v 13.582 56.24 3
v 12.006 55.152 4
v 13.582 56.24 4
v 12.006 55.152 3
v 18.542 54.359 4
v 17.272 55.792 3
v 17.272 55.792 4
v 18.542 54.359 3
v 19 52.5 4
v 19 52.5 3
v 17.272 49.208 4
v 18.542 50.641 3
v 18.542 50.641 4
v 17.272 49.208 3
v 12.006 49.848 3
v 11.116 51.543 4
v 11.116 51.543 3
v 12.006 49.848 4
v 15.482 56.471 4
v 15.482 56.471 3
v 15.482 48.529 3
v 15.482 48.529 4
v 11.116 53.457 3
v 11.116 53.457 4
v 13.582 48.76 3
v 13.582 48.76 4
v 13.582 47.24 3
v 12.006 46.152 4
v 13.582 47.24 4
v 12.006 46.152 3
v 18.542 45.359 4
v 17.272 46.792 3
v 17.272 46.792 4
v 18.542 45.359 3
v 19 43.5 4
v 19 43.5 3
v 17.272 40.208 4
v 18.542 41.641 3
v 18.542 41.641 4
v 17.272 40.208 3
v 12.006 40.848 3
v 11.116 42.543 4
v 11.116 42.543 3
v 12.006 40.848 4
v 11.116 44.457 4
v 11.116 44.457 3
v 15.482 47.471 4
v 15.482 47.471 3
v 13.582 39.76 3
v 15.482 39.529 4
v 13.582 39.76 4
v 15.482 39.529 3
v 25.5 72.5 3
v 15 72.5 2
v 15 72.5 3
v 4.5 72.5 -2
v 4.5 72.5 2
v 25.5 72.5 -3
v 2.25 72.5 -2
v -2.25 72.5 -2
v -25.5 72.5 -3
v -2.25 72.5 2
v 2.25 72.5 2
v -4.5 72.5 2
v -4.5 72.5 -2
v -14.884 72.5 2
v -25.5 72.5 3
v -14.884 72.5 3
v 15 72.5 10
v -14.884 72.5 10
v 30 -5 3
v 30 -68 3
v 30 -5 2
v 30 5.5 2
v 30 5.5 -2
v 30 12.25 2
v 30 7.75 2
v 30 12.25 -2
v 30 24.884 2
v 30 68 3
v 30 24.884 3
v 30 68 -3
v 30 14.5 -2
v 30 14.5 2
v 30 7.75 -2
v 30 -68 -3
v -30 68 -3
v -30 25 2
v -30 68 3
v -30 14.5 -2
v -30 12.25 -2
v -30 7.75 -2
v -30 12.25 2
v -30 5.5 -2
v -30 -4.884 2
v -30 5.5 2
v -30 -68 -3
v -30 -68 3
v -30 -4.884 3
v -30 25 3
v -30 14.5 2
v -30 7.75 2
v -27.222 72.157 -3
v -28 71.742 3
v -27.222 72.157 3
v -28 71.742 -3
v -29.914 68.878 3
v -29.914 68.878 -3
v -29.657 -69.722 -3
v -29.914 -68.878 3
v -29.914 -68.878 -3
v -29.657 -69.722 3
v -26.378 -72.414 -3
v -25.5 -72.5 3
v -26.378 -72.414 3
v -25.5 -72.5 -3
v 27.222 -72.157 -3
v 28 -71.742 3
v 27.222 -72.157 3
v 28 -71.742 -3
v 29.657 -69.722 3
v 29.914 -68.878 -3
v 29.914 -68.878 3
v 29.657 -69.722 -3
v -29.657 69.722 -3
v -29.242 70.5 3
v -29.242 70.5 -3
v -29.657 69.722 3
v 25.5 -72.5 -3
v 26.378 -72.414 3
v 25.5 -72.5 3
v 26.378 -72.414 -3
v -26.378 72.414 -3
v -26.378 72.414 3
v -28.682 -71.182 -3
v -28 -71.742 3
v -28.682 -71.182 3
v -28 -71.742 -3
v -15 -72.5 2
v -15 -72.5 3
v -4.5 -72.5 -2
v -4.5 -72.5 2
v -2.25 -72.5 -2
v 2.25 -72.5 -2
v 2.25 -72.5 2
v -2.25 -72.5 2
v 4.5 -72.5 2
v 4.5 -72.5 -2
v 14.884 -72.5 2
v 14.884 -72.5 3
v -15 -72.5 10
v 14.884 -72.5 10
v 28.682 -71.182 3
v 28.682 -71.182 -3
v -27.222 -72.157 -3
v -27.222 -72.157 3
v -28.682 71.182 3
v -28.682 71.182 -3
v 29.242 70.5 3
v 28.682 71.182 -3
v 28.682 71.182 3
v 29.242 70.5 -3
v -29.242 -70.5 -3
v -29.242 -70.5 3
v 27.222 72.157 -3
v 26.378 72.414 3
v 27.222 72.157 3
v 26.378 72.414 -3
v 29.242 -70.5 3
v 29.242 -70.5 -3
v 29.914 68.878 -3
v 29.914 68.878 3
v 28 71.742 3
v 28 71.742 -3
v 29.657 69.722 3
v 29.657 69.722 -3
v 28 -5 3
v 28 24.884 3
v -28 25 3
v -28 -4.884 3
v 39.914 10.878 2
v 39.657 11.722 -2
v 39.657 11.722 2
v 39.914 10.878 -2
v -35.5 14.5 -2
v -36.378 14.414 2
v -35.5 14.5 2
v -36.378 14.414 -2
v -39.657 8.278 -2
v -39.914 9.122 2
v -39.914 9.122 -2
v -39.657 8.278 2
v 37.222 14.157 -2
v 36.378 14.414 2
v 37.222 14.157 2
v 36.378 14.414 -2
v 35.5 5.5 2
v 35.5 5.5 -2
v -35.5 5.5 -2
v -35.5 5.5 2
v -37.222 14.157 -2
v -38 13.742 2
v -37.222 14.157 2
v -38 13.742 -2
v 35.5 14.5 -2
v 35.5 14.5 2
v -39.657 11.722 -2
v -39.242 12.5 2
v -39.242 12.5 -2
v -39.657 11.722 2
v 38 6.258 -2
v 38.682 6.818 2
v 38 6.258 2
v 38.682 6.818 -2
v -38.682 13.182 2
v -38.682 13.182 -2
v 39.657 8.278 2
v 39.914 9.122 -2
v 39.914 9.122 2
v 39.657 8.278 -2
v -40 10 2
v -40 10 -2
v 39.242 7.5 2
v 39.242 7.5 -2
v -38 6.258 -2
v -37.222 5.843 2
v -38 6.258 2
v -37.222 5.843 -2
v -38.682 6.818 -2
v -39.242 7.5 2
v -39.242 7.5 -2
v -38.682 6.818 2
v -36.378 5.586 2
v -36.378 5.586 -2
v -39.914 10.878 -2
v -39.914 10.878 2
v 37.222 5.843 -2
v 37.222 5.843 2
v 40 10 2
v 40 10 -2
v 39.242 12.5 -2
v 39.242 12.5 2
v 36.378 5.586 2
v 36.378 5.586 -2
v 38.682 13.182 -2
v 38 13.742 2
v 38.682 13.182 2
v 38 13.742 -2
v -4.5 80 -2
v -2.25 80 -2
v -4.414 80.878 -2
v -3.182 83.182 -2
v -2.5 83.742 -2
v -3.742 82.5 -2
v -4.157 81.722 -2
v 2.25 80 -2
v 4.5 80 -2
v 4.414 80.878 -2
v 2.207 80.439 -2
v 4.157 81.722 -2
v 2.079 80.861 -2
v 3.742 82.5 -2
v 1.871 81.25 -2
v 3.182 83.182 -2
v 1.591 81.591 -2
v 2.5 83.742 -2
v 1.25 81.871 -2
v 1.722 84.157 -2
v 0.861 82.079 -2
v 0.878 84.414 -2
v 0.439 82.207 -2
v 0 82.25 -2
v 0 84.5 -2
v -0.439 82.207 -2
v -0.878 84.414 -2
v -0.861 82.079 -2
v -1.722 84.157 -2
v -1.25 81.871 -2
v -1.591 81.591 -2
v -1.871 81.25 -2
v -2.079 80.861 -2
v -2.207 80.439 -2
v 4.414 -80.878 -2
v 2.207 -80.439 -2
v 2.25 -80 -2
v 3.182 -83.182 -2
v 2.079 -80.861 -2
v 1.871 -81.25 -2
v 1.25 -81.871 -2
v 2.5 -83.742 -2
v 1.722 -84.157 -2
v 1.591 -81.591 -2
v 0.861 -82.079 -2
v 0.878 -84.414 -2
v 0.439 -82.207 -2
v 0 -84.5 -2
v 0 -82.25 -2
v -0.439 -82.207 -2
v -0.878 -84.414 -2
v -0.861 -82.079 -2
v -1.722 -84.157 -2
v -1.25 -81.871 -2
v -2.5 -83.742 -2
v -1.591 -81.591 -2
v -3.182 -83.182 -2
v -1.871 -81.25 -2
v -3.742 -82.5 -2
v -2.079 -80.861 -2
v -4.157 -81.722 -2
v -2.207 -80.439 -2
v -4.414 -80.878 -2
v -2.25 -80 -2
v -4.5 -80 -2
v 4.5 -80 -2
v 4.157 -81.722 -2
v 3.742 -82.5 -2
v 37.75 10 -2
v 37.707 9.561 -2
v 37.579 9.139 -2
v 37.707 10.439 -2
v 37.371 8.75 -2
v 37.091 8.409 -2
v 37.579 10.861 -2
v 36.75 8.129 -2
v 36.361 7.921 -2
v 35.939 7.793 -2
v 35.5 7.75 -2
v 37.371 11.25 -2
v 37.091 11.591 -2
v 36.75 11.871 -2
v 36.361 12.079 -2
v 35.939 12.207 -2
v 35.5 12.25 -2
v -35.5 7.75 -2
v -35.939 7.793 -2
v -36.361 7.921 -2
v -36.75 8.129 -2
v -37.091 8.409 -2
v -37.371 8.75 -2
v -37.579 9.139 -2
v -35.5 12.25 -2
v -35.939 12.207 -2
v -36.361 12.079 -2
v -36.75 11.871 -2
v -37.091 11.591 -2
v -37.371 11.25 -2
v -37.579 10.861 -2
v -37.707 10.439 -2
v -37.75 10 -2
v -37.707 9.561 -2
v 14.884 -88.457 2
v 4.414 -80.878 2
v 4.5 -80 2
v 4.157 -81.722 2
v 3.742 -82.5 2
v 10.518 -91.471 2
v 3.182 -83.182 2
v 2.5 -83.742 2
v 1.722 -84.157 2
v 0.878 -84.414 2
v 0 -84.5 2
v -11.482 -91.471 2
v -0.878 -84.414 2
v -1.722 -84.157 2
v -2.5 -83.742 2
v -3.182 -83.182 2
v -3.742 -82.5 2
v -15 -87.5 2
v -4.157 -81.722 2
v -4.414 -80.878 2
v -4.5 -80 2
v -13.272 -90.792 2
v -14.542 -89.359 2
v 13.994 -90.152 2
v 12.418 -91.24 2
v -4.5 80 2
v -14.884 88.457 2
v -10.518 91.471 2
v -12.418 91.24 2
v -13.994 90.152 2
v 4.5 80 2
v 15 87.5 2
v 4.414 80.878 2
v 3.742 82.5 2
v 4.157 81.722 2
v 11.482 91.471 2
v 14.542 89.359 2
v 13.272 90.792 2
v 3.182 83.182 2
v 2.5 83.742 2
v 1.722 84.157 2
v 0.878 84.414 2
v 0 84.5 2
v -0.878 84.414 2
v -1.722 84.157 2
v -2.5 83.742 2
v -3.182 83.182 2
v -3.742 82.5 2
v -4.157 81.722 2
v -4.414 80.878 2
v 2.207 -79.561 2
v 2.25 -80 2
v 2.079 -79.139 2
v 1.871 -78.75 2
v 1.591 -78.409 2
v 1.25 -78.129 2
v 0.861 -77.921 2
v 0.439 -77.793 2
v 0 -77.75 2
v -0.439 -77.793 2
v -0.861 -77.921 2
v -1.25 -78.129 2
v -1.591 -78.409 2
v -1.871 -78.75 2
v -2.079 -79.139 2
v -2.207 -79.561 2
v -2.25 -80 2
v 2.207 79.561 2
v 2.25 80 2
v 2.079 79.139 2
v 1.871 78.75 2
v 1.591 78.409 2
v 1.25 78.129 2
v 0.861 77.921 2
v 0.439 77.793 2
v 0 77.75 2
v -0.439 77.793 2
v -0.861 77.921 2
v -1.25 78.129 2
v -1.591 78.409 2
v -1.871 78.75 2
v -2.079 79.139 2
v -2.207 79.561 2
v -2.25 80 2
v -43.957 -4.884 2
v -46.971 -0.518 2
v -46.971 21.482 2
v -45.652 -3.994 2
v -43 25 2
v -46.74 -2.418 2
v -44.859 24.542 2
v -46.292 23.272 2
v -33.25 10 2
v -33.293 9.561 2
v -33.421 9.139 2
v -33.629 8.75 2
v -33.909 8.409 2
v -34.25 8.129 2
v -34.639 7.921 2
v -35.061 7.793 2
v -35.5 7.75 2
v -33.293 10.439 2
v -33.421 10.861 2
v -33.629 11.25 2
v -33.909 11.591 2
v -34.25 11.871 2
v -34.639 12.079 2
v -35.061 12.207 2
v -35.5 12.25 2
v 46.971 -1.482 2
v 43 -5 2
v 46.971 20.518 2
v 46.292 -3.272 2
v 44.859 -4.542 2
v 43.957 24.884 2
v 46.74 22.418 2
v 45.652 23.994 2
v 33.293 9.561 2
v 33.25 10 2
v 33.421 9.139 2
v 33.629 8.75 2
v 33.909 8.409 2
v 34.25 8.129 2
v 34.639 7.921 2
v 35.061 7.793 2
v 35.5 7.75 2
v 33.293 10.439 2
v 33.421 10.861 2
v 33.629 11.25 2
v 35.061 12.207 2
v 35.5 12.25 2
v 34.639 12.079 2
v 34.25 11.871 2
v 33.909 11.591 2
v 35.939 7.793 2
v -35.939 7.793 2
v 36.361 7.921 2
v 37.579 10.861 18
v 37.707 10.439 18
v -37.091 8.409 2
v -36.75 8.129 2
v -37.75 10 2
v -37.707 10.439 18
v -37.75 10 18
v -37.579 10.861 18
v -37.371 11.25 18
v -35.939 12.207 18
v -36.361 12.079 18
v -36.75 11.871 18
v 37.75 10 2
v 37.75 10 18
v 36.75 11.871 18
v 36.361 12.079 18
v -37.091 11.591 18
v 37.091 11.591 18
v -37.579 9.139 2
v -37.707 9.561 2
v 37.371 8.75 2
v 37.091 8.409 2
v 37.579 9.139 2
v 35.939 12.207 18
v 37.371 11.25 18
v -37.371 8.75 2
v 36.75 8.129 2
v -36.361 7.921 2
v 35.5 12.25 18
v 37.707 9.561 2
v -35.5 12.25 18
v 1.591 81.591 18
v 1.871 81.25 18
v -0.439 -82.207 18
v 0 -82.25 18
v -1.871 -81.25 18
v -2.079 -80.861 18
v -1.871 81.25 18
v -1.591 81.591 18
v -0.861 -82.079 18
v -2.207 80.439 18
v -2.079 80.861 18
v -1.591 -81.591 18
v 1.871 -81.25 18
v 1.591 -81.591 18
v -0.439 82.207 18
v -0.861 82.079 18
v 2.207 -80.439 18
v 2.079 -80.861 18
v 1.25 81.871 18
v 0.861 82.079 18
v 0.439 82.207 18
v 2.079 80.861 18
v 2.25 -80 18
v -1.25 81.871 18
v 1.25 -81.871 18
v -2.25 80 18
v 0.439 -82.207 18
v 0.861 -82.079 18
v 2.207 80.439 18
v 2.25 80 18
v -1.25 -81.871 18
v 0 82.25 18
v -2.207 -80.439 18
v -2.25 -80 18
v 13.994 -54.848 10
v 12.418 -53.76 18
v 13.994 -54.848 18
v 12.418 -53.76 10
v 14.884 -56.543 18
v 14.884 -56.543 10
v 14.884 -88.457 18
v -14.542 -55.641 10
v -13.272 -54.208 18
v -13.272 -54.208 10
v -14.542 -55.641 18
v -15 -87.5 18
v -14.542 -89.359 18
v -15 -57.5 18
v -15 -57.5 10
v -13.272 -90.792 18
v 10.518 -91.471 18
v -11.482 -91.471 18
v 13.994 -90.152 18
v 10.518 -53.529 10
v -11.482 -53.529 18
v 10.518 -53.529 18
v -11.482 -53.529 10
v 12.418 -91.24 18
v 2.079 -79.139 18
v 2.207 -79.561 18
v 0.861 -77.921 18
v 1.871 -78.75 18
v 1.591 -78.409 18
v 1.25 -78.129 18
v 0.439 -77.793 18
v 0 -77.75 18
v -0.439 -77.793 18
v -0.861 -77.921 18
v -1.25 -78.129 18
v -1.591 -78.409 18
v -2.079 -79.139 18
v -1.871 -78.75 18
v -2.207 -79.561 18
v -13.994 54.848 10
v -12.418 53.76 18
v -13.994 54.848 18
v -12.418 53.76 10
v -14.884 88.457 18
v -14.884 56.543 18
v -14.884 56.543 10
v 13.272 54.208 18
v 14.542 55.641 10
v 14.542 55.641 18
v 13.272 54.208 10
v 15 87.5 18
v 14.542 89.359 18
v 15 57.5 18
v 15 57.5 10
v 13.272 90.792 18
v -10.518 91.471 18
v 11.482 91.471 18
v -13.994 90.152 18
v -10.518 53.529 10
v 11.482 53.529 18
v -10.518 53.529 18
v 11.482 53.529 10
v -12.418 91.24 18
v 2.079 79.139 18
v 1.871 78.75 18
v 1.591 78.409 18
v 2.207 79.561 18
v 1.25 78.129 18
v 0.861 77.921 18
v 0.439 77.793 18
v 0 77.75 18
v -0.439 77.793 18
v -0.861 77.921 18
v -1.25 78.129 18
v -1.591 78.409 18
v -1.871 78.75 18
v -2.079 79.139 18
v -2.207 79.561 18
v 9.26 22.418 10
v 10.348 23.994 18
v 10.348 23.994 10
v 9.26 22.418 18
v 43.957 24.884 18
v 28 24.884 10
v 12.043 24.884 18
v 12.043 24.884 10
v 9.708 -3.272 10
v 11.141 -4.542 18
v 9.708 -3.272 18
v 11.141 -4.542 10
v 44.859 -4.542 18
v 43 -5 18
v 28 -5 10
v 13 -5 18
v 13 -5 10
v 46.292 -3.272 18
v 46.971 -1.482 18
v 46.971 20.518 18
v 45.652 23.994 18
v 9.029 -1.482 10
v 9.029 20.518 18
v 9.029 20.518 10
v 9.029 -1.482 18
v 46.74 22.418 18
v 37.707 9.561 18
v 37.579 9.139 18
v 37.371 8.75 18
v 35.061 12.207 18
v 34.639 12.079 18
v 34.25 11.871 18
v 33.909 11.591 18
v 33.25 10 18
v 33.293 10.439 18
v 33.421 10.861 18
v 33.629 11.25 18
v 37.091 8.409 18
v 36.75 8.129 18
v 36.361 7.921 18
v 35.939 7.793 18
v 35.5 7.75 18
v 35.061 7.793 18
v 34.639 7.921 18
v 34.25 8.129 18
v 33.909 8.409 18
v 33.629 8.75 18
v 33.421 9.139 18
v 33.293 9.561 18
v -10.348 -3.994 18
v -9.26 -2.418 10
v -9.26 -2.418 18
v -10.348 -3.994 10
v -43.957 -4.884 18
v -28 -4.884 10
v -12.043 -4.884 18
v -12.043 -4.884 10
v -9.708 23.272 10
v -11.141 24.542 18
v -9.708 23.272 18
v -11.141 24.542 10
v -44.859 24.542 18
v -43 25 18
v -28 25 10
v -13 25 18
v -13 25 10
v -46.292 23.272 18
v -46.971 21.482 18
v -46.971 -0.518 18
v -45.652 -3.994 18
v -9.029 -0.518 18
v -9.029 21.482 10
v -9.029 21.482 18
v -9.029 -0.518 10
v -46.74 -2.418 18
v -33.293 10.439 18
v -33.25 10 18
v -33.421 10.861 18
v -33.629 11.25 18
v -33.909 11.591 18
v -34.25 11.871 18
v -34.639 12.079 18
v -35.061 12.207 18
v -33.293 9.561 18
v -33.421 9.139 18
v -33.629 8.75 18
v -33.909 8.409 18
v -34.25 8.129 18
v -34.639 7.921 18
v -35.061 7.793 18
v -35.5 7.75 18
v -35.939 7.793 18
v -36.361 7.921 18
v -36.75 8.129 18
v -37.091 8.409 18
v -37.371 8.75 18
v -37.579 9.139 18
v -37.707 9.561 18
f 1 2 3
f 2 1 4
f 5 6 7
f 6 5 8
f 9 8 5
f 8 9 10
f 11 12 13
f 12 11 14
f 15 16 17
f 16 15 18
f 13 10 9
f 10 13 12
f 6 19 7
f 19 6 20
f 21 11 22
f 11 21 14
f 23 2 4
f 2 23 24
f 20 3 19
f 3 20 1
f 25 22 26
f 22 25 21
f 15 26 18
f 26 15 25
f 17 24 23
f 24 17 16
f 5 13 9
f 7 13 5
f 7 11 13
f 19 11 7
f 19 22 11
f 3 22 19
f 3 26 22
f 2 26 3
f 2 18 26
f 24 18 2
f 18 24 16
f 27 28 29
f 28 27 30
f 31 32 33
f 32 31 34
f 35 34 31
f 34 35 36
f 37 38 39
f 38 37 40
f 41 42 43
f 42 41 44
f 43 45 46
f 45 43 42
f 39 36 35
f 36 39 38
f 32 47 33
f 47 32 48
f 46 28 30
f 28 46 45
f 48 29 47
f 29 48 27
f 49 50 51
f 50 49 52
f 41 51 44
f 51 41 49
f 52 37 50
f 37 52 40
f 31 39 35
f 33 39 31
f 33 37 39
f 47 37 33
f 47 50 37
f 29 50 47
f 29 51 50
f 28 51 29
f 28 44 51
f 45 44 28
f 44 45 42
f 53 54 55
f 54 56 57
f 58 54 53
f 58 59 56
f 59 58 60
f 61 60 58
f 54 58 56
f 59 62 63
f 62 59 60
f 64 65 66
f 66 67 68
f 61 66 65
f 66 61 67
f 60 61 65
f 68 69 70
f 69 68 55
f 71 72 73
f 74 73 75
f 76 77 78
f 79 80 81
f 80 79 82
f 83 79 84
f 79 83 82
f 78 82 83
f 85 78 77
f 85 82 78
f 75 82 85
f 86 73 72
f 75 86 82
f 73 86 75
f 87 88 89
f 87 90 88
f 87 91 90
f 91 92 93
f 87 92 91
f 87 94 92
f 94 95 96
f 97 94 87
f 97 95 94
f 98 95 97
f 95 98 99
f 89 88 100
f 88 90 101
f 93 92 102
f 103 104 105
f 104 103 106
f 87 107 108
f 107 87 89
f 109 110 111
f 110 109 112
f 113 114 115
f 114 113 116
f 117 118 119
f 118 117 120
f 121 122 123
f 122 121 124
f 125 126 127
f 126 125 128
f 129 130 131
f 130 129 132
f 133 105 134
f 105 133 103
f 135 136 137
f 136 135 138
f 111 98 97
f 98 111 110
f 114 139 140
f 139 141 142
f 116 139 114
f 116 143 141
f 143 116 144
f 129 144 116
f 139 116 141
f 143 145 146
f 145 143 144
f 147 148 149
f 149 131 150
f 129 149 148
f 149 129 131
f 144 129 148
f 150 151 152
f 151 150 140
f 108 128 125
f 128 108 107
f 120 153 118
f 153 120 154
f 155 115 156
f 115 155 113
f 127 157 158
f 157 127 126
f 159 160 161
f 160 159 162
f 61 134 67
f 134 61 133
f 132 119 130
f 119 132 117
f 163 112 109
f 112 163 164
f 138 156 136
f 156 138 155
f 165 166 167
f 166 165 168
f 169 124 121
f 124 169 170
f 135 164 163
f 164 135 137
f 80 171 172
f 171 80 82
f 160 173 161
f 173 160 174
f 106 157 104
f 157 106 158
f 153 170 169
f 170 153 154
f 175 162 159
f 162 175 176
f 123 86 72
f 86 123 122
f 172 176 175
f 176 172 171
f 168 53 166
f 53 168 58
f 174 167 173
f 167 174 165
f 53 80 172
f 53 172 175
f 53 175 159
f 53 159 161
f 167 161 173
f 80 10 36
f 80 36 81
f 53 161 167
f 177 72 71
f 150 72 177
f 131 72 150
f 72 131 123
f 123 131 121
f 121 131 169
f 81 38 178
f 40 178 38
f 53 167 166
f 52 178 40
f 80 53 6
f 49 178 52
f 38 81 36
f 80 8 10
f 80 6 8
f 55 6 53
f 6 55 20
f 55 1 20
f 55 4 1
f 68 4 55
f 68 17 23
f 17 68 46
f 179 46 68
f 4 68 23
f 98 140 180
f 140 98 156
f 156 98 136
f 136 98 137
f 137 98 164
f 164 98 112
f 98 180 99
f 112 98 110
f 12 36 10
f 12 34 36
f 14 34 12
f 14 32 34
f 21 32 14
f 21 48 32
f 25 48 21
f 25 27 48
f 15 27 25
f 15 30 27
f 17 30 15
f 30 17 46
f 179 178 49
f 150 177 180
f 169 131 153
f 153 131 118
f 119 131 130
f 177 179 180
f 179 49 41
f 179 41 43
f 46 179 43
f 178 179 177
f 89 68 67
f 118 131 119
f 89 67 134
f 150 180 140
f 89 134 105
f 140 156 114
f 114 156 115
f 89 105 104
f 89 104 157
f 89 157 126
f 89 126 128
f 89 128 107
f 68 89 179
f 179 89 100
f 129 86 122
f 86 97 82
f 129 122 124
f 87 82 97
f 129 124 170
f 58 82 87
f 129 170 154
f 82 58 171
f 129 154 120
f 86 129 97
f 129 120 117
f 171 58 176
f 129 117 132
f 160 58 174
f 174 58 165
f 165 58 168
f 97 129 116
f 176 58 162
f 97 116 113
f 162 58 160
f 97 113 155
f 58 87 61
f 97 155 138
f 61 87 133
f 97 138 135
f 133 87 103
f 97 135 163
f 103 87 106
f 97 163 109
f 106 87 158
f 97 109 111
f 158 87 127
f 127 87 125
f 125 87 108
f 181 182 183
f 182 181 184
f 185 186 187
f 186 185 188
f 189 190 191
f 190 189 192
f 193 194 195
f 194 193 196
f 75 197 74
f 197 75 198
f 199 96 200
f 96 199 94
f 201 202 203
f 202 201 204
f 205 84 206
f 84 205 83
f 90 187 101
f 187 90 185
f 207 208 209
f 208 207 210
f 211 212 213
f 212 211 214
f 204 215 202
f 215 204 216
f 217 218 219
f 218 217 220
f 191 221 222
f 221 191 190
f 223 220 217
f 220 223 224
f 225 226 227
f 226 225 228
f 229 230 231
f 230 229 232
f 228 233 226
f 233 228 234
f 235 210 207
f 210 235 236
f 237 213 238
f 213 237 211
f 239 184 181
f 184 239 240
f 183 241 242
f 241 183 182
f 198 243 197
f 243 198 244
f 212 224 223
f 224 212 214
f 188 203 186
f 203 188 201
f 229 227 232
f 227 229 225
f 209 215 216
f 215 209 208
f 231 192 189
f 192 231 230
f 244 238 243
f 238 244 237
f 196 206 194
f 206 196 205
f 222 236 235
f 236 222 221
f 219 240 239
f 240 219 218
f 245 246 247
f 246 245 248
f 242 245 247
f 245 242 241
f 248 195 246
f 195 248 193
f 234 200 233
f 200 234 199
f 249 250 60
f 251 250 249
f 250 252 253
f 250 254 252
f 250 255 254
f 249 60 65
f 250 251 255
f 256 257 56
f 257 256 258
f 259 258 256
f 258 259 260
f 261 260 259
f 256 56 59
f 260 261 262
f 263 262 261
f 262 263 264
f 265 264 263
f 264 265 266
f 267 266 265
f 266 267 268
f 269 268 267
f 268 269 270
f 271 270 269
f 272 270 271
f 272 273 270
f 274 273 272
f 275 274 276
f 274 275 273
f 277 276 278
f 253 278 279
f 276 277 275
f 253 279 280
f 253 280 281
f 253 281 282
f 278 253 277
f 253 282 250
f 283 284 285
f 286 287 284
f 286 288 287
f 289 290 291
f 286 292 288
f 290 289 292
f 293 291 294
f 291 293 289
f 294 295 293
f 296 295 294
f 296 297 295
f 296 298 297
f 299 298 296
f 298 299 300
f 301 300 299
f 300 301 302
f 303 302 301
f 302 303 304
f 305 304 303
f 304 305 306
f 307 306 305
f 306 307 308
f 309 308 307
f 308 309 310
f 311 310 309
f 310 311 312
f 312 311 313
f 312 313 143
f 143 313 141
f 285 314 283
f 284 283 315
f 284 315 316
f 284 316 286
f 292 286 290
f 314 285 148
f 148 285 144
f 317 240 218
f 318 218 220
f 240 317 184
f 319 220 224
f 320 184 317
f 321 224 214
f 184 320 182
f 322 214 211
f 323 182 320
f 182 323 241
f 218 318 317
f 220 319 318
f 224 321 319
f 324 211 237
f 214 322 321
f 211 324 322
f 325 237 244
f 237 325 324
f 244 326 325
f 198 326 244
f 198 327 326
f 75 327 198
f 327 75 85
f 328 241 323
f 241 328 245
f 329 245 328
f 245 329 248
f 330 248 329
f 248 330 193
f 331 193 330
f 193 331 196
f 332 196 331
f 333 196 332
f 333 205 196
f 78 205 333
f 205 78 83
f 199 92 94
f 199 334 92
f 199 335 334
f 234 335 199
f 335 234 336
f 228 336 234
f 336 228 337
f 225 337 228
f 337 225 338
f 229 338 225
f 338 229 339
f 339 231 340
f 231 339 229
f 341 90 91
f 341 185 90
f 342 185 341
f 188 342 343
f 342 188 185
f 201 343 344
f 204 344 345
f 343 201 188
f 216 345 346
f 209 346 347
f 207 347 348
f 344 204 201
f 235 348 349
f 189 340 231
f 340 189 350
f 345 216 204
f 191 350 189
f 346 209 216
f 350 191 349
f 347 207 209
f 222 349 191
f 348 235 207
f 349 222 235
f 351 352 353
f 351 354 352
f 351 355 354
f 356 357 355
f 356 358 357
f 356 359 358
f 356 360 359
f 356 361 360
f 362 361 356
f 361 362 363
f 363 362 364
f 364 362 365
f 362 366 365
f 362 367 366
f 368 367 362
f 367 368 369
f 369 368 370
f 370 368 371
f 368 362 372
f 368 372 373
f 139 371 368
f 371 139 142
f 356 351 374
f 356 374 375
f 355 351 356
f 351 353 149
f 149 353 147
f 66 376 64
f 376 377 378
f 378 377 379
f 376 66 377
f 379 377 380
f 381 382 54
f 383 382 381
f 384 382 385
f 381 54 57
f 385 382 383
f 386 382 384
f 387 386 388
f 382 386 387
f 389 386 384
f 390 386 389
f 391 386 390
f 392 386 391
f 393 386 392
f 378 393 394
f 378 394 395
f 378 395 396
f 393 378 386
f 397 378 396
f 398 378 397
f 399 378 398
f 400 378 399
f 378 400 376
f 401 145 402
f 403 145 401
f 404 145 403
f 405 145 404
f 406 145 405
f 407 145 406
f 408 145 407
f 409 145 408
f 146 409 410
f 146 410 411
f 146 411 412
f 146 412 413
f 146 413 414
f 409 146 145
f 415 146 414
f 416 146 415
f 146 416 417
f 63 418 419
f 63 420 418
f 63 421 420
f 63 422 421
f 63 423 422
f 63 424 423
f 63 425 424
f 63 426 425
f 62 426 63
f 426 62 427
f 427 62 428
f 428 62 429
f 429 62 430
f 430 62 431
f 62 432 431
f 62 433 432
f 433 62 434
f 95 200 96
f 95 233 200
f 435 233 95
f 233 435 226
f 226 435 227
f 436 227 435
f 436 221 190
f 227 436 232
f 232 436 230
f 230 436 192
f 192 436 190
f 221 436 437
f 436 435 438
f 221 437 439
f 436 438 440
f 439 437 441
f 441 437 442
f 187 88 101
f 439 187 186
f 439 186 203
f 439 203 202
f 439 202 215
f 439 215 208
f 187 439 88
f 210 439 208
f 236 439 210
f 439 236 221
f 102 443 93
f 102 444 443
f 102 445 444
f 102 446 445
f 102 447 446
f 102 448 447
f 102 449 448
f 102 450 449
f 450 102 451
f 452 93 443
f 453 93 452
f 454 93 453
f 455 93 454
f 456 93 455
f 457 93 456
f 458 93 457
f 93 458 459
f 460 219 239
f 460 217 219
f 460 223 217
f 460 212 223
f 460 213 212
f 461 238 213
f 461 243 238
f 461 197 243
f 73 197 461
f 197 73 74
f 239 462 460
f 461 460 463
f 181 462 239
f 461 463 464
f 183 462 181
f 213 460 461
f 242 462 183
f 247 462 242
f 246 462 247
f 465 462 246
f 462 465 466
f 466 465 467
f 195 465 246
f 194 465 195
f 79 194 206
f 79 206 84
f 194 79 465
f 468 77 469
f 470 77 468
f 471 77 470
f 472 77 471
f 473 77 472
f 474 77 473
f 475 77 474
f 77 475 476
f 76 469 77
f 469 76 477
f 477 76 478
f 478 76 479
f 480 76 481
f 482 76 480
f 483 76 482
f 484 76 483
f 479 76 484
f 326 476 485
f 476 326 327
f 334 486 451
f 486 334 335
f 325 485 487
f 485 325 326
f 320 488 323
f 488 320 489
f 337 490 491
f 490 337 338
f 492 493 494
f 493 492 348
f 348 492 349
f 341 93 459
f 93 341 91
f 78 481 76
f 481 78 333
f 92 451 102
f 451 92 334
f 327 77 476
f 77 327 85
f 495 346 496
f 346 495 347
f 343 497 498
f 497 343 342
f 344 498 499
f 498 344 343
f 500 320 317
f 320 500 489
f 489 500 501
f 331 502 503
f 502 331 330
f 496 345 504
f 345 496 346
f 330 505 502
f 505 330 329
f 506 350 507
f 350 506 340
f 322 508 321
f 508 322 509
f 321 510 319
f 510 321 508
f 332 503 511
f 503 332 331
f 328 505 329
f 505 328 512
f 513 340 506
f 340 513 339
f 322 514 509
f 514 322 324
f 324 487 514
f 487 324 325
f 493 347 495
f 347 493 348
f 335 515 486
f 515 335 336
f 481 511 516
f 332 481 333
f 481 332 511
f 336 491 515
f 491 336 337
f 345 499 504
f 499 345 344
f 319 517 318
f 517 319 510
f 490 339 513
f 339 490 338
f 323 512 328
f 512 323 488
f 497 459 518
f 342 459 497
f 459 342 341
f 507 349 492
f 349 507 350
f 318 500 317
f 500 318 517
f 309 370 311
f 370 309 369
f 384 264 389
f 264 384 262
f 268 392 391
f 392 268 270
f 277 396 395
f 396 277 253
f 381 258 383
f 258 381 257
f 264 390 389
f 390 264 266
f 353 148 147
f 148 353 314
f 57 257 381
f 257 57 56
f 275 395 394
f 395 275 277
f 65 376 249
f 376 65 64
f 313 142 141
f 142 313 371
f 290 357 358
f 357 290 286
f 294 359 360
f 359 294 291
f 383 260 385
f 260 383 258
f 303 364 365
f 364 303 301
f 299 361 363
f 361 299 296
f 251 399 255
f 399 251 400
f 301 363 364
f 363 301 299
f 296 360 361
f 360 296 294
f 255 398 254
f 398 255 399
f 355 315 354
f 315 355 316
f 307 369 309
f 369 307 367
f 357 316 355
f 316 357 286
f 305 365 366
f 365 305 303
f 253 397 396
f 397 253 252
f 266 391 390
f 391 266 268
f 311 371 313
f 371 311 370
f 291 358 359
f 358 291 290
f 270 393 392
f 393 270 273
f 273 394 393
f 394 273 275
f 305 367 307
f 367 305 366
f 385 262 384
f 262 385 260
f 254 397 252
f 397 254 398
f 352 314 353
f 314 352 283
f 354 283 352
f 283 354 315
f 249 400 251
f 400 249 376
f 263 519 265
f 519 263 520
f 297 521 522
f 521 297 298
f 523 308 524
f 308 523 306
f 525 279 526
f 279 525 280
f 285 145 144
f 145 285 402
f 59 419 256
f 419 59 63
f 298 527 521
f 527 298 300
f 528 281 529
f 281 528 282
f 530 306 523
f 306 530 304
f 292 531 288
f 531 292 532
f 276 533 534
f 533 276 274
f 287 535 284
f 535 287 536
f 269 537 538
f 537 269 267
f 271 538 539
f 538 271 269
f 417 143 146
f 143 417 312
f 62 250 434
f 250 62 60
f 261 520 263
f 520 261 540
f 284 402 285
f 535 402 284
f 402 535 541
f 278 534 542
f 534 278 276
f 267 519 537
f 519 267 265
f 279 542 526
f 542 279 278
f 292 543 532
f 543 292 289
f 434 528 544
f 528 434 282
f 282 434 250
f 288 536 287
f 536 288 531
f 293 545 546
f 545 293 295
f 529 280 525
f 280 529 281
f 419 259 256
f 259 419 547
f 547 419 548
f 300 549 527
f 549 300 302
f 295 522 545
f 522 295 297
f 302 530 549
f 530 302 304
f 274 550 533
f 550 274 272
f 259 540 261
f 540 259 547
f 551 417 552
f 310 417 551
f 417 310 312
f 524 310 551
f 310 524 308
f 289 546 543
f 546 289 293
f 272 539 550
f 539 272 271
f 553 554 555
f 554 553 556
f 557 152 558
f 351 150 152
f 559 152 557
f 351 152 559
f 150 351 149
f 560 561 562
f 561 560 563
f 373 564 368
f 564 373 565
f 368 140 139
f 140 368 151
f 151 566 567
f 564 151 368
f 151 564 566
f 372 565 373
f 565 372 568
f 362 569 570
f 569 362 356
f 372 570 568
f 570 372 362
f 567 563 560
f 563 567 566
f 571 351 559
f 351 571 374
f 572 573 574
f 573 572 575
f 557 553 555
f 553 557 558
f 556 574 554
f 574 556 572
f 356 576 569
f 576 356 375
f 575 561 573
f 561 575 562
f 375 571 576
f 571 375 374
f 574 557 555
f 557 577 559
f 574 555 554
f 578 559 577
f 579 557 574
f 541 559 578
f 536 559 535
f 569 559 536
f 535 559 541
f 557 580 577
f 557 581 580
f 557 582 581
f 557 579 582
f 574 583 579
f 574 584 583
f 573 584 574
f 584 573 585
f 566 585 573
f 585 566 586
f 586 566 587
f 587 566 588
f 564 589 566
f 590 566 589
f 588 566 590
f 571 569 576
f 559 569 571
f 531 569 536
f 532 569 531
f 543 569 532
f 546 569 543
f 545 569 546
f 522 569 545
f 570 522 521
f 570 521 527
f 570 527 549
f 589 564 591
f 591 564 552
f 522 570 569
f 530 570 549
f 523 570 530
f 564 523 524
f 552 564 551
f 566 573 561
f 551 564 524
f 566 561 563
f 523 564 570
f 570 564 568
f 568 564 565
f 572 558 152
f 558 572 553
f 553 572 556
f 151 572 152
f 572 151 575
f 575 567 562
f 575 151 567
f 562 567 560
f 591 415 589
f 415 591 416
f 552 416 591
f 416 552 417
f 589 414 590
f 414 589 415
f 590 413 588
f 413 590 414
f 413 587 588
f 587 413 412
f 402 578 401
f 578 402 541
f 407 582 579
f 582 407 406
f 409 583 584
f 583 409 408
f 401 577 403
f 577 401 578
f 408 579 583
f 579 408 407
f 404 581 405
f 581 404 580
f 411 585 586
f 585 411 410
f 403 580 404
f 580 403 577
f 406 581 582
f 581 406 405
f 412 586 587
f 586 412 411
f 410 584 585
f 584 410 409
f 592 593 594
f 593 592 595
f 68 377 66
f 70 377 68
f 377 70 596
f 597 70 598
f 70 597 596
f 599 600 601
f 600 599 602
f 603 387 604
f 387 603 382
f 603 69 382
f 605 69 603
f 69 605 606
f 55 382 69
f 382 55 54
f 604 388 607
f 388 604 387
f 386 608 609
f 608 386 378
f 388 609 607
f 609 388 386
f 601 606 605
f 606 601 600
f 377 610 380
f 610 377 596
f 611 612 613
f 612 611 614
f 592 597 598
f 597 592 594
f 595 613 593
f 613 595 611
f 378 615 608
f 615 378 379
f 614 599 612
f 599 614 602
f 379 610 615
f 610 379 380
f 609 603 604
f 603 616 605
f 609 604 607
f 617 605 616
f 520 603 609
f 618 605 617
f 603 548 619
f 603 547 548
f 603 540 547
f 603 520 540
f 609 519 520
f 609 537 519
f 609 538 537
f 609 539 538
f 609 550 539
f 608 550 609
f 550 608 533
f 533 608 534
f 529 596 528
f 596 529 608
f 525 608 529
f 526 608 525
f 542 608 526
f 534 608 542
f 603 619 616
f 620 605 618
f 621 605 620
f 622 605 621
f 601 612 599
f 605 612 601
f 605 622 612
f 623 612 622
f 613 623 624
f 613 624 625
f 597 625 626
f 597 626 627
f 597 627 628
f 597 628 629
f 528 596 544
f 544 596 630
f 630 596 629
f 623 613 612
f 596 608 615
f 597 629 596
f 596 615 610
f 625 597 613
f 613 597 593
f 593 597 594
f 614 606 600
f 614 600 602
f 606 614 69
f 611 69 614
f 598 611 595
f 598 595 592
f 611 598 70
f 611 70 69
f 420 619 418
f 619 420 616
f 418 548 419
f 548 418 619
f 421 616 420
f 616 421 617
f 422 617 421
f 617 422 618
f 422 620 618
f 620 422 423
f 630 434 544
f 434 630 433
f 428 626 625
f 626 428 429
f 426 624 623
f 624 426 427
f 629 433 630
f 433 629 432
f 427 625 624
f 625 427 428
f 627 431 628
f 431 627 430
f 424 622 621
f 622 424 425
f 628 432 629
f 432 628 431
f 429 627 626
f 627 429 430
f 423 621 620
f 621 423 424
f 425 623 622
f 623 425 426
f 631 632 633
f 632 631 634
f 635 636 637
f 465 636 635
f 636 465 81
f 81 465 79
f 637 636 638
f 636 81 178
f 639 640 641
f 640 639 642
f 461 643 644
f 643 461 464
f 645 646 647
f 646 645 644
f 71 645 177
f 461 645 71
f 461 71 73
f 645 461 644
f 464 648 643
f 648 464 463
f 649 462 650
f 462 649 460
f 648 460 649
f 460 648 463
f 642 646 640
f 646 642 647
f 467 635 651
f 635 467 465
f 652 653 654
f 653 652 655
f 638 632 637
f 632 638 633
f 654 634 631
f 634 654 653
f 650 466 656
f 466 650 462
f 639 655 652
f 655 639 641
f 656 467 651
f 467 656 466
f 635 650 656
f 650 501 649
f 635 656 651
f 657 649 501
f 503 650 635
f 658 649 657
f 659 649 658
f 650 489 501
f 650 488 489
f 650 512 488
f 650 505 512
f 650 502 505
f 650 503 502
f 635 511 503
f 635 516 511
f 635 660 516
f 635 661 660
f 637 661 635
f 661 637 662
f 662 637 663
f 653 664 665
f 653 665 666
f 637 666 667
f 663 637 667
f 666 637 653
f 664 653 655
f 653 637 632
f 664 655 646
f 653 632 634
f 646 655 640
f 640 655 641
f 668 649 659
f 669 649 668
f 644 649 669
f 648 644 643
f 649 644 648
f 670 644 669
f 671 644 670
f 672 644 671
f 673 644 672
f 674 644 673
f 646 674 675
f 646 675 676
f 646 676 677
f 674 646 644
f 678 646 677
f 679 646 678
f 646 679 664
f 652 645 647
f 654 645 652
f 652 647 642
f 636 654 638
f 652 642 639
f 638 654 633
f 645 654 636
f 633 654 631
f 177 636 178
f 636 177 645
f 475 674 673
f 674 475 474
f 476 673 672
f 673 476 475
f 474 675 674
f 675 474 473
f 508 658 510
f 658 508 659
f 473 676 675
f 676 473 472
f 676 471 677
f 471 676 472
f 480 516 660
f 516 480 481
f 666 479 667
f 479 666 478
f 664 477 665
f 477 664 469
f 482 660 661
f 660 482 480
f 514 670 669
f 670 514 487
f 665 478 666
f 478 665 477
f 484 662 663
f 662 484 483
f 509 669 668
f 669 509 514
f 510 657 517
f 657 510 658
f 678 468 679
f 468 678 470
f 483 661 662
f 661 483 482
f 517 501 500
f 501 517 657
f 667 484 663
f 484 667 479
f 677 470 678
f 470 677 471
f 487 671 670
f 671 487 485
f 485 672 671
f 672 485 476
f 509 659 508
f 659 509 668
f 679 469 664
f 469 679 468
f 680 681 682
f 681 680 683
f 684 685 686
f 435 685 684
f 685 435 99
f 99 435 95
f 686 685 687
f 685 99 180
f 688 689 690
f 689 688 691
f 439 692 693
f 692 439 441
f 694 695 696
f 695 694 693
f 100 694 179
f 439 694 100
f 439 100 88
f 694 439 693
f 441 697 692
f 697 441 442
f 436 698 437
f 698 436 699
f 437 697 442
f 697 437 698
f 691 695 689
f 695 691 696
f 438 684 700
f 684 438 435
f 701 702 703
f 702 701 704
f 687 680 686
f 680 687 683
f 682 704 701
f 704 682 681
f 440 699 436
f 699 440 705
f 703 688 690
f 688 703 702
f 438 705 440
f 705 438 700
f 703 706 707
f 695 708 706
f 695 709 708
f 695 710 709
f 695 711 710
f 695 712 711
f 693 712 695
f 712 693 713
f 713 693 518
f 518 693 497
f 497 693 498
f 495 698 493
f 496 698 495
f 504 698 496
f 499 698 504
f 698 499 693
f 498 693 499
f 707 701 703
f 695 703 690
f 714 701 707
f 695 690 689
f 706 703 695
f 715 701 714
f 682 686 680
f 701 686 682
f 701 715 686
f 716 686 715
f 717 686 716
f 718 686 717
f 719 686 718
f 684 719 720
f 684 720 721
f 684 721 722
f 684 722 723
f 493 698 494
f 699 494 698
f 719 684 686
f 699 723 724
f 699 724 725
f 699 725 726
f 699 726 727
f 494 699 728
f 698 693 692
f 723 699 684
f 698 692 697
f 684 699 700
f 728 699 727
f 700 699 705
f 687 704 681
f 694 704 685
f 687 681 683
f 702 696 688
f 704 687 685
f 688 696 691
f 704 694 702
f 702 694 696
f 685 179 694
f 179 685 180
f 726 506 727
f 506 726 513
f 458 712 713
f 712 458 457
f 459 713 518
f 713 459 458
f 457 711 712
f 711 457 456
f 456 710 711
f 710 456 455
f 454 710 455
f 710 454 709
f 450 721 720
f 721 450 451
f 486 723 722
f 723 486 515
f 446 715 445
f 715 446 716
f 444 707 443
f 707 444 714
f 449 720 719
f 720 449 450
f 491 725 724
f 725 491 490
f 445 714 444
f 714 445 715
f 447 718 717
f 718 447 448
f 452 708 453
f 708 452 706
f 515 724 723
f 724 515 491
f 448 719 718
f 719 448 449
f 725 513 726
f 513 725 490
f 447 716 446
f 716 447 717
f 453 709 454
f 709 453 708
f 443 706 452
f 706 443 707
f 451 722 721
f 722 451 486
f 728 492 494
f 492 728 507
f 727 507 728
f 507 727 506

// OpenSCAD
// file: holder.scad
len_phone = 145;
d_screw_m4 = 4.5;
width_phone = 56;
thikness_holder = 4;
thikness_phone = 8;
append = 15;
corner_round = 8;
w_grip = 30;

holder_set();
//vertical_block(len_phone);

module grip() {
    difference() {
        grip_base();
        
        color("red")
        translate([0, w_grip/2, thikness_phone])
        cube([w_grip+1, w_grip, 2*thikness_phone], center=true);
        
        translate([0, -w_grip/4, 0])
        cylinder(d=d_screw_m4, 3*thikness_phone, center=true, $fn=32);
    }
}


module grip_base() {
    hull() {
        translate([w_grip/2-corner_round/2, -w_grip/2, 0])
        cylinder(d=corner_round, 2*thikness_phone, center=true);
        
        translate([-w_grip/2+corner_round/2, -w_grip/2, 0])
        cylinder(d=corner_round, 2*thikness_phone, center=true);
        
        translate([w_grip/2-corner_round/2, w_grip/2, 0])
        cylinder(d=corner_round, 2*thikness_phone, center=true);
        
        translate([-w_grip/2+corner_round/2, w_grip/2, 0])
        cylinder(d=corner_round, 2*thikness_phone, center=true);
    }
}


module horizontal_block(len_block, offset_vertical) {
    len_block = len_block + append;
    
    translate([0, offset_vertical, 0])
    cylinder(d=20, h=thikness_holder, center=true, $fn=32);
    
    difference() {
        hull() {
            translate([len_block/2, offset_vertical, 0])
            cylinder(d=9, h=thikness_holder, center=true, $fn=32);
            
            translate([-len_block/2, offset_vertical, 0])
            cylinder(d=9, h=thikness_holder, center=true, $fn=32);
        }
        color("red")
        hull() {
            translate([len_block/2, offset_vertical, 0])
            cylinder(d=d_screw_m4, h=thikness_holder+2, center=true, $fn=32);
            
            translate([-len_block/2, offset_vertical, 0])
            cylinder(d=d_screw_m4, h=thikness_holder+2, center=true, $fn=32);
        }
    }
}


module vertical_block(len_block) {
    len_block = len_block + append;
    
        difference() {
            hull() {
                //translate([0, -len_phone/2, 0])
                translate([0, -len_block/2, 0])
                cylinder(d=9, h=thikness_holder, center=true, $fn=32);
                
                //translate([0, -len_phone/2, 0])
                translate([0, len_block/2, 0])
                cylinder(d=9, h=thikness_holder, center=true, $fn=32);
            }
            color("red")
            hull() {
                //translate([0, -len_phone/2, 0])
                translate([0, -len_block/2, 0])
                cylinder(d=d_screw_m4, h=thikness_holder+2, center=true, $fn=32);
                
                //translate([0, -len_phone/2, 0])
                translate([0, len_block/2, 0])
                cylinder(d=d_screw_m4, h=thikness_holder+2, center=true, $fn=32);
        }
    }
}

module holder_set() {
    horizontal_block(len_block=width_phone, offset_vertical=10);
    vertical_block(len_block=len_phone);
    
    translate([0, -len_phone/2, thikness_phone+thikness_holder/2])
    rotate([0, 180, 0])
    grip();
    
    translate([0, len_phone/2, thikness_phone+thikness_holder/2])
    rotate([0, 180, 180])
    grip();
    
    translate([width_phone/2, 10, thikness_phone+thikness_holder/2])
    rotate([0, 180, 90])
    grip();
    
    translate([-width_phone/2, 10, thikness_phone+thikness_holder/2])
    rotate([0, 180, -90])
    grip();
}
// file: smartphone.scad
echo("Работа Лукьянова Данила!");
len_phone = 145;
width_phone = 60;
thickness_phone = 6;
corner_round = 9;

smartphone();



module smartphone() {
    smartphone_block();
    cameras_block();
}

module cameras_block() {
    color("blue")
    translate([width_phone/2-15, len_phone/2-20, 0])
    cylinder(d=8, h = thickness_phone/2+1);

    color("blue")
    translate([width_phone/2-15, len_phone/2-29, 0])
    cylinder(d=8, h = thickness_phone/2+1);
}

module smartphone_block() {
    hull() {
        translate([width_phone/2-corner_round/2, len_phone/2-corner_round/2, 0])
        cylinder(h=thickness_phone, d=corner_round, $fn=32, center=true);
        
        mirror([1, 0, 0])
        translate([width_phone/2-corner_round/2, len_phone/2-corner_round/2, 0])
        cylinder(h=thickness_phone, d=corner_round, $fn=32, center=true);
        
        mirror([0, 1, 0])
        translate([width_phone/2-corner_round/2, len_phone/2-corner_round/2, 0])
        cylinder(h=thickness_phone, d=corner_round, $fn=32, center=true);
        
        mirror([1, 0, 0])
        mirror([0, 1, 0])
        translate([width_phone/2-corner_round/2, len_phone/2-corner_round/2, 0])
        cylinder(h=thickness_phone, d=corner_round, $fn=32, center=true);
    }
}
// main file
use <smartphone.scad>
use <holder.scad>
    
echo ("Работа Лукьянова Данила!");
smartphone();
holder_set();
